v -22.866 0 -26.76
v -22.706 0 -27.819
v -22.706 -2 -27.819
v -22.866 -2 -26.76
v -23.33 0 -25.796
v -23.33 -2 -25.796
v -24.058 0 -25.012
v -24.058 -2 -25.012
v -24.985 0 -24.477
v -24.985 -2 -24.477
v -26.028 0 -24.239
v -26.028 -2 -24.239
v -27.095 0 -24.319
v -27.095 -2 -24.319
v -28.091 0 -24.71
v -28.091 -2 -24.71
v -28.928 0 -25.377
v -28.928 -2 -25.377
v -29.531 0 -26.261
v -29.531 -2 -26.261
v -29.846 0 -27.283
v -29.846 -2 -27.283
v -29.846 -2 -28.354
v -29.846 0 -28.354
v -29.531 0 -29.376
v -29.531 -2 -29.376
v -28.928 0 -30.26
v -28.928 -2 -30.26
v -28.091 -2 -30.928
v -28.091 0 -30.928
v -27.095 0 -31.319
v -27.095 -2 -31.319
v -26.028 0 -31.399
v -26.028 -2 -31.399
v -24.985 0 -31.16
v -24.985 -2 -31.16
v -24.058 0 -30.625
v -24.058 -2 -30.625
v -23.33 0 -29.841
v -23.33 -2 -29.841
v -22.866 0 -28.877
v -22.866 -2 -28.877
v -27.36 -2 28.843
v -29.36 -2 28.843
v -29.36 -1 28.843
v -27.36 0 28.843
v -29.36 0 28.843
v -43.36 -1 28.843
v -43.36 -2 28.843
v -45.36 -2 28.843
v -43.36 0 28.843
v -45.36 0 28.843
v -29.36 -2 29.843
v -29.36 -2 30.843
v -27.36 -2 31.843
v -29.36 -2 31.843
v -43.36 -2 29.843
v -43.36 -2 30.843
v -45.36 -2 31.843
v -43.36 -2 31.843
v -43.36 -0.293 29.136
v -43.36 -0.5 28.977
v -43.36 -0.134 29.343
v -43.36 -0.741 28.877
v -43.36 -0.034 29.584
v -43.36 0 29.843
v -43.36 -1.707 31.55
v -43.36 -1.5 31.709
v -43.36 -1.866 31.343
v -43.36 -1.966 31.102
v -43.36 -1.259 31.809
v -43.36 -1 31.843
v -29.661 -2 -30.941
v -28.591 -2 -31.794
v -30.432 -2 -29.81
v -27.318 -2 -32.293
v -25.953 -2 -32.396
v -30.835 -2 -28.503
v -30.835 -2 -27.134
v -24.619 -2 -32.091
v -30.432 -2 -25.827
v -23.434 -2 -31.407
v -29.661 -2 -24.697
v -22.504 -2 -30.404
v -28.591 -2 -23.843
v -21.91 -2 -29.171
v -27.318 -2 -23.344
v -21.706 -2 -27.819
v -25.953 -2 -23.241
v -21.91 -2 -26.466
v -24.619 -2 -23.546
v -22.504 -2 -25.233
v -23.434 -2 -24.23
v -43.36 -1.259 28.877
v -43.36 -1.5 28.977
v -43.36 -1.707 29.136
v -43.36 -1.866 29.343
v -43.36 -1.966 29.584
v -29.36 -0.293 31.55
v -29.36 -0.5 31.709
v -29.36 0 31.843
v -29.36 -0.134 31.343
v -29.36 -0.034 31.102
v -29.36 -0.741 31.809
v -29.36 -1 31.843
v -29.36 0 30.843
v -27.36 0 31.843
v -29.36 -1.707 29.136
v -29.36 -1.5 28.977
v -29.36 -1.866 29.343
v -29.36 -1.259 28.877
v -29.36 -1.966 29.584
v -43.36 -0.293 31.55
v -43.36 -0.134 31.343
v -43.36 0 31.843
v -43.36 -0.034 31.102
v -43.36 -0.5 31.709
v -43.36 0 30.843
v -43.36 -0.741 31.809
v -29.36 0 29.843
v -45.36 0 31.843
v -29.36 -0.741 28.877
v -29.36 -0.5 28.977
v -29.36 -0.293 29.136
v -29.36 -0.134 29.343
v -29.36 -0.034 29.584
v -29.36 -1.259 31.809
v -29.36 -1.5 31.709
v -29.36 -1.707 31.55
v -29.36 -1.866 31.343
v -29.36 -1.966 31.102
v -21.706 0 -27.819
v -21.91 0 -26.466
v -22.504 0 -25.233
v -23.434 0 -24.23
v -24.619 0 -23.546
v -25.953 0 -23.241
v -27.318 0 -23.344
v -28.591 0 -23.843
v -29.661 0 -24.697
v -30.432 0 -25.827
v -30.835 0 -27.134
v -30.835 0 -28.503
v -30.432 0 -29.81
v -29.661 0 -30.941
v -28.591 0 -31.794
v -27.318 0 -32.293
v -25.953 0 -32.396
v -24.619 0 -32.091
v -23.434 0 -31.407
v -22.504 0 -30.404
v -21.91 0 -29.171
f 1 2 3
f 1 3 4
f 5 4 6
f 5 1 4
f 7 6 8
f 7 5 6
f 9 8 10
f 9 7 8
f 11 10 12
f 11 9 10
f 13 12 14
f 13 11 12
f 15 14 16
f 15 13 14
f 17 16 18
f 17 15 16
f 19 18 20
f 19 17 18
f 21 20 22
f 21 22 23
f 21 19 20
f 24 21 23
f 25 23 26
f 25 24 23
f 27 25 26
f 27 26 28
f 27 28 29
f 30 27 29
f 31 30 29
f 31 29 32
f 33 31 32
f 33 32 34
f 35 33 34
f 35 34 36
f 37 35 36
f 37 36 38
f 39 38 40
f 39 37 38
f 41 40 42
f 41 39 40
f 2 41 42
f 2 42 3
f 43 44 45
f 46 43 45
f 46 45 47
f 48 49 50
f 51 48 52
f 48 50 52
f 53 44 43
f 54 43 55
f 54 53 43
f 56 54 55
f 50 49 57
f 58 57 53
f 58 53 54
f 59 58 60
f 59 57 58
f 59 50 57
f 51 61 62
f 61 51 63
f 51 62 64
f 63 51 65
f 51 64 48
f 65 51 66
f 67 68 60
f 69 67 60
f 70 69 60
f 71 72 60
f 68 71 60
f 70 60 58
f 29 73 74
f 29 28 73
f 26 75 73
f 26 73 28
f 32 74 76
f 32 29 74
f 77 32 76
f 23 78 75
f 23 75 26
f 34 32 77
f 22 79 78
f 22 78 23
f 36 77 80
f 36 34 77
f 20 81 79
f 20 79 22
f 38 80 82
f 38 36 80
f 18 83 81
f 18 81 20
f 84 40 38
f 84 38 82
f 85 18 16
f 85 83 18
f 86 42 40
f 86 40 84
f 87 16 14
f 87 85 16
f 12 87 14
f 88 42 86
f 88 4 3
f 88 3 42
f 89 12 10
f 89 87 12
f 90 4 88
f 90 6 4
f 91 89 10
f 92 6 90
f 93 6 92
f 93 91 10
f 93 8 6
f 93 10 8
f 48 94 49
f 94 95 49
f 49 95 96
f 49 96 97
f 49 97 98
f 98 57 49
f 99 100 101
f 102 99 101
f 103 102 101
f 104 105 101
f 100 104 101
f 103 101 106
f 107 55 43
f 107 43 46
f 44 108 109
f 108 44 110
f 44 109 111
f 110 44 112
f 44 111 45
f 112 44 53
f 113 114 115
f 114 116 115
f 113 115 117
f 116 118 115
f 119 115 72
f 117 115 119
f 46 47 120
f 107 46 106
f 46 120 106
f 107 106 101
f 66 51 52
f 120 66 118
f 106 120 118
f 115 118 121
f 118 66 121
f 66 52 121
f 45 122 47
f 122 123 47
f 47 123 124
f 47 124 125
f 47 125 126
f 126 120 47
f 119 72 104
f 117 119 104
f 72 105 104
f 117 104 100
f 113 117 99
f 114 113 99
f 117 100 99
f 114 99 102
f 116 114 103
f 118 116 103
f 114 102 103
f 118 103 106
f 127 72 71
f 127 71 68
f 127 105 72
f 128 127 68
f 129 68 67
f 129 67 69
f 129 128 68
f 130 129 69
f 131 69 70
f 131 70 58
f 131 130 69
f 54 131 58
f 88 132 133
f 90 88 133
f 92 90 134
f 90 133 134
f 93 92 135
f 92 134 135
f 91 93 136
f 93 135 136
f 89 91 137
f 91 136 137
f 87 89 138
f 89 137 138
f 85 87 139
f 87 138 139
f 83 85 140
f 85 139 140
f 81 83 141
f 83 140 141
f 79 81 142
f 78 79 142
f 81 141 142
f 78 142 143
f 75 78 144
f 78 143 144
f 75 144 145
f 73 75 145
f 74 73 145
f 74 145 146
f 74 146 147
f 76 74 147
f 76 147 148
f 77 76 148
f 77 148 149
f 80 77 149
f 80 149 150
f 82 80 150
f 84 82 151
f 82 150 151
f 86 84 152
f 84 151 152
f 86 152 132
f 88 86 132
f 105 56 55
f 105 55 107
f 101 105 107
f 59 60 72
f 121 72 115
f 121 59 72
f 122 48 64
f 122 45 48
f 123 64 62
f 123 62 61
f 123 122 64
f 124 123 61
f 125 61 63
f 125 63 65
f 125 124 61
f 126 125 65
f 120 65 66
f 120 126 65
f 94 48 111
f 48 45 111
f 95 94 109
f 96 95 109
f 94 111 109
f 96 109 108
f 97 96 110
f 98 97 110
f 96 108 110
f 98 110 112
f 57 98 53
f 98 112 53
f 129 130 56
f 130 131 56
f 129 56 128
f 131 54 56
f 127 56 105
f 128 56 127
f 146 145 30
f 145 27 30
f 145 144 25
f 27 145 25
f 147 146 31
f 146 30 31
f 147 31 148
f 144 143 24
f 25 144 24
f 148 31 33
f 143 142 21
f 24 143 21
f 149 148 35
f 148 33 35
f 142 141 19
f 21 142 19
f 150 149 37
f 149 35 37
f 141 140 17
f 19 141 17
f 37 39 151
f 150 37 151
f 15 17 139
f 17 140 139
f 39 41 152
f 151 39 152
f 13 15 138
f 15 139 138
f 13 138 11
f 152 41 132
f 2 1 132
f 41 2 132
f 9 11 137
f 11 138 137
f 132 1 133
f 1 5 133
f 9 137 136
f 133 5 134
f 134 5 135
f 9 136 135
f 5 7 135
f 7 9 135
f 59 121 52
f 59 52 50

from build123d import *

# Parameters (mm, degrees)
F0_W     = 14
F0_H     = 3
F1_DEPTH = 2
F4_R     = 0.99999
F2_W     = 2
F2_H     = 3
F5_DEPTH = 2
F3_W     = 2
F3_H     = 3
F6_DEPTH = 2
F7_R     = 4.59
F7_R_2   = 3.59
F8_DEPTH = 2


# Not quite as in the source:
# - a fillet or chamfer is up to 0.001 mm smaller than in the source, because OpenCascade refuses the exact size


with BuildPart() as f1:
    # F0 (on Front) → F1 (new body)
    with BuildSketch(Plane.XZ):
        with Locations((-36.3600781634, 30.342812404)):
            Rectangle(F0_W, F0_H)
    extrude(amount=F1_DEPTH)

    # F4 (radius 1 in the source; OpenCascade refuses exactly that, so slightly less here)
    f4_edges = [f1.edges().sort_by_distance(p)[0] for p in [
        (-36.360078, 0, 31.842812),
        (-36.360078, 0, 28.842812),
        (-36.360078, -2, 31.842812),
        (-36.360078, -2, 28.842812),
    ]]
    fillet(f4_edges, radius=F4_R)

    # F2 (on face) → F5 (join)
    with BuildSketch(Plane(origin=(-43.3600781634, 0, 0), x_dir=(0, -1, 0), z_dir=(-1, 0, 0))):
        with Locations((1, 30.342812404)):
            Rectangle(F2_W, F2_H)
    extrude(amount=F5_DEPTH)

    # F3 (on face) → F6 (join)
    with BuildSketch(Plane.YZ.offset(-29.3600781634)):
        with Locations((-1, 30.342812404)):
            Rectangle(F3_W, F3_H)
    extrude(amount=F6_DEPTH)


with BuildPart() as f8:
    # F7 (on Front) → F8 (new body)
    with BuildSketch(Plane.XZ):
        with Locations((-26.2961350381, -27.8185419738)):
            Circle(F7_R)
        with Locations((-26.2961350381, -27.8185419738)):
            Circle(F7_R_2, mode=Mode.SUBTRACT)
    extrude(amount=F8_DEPTH)


solid = Compound([f1.part, f8.part])
